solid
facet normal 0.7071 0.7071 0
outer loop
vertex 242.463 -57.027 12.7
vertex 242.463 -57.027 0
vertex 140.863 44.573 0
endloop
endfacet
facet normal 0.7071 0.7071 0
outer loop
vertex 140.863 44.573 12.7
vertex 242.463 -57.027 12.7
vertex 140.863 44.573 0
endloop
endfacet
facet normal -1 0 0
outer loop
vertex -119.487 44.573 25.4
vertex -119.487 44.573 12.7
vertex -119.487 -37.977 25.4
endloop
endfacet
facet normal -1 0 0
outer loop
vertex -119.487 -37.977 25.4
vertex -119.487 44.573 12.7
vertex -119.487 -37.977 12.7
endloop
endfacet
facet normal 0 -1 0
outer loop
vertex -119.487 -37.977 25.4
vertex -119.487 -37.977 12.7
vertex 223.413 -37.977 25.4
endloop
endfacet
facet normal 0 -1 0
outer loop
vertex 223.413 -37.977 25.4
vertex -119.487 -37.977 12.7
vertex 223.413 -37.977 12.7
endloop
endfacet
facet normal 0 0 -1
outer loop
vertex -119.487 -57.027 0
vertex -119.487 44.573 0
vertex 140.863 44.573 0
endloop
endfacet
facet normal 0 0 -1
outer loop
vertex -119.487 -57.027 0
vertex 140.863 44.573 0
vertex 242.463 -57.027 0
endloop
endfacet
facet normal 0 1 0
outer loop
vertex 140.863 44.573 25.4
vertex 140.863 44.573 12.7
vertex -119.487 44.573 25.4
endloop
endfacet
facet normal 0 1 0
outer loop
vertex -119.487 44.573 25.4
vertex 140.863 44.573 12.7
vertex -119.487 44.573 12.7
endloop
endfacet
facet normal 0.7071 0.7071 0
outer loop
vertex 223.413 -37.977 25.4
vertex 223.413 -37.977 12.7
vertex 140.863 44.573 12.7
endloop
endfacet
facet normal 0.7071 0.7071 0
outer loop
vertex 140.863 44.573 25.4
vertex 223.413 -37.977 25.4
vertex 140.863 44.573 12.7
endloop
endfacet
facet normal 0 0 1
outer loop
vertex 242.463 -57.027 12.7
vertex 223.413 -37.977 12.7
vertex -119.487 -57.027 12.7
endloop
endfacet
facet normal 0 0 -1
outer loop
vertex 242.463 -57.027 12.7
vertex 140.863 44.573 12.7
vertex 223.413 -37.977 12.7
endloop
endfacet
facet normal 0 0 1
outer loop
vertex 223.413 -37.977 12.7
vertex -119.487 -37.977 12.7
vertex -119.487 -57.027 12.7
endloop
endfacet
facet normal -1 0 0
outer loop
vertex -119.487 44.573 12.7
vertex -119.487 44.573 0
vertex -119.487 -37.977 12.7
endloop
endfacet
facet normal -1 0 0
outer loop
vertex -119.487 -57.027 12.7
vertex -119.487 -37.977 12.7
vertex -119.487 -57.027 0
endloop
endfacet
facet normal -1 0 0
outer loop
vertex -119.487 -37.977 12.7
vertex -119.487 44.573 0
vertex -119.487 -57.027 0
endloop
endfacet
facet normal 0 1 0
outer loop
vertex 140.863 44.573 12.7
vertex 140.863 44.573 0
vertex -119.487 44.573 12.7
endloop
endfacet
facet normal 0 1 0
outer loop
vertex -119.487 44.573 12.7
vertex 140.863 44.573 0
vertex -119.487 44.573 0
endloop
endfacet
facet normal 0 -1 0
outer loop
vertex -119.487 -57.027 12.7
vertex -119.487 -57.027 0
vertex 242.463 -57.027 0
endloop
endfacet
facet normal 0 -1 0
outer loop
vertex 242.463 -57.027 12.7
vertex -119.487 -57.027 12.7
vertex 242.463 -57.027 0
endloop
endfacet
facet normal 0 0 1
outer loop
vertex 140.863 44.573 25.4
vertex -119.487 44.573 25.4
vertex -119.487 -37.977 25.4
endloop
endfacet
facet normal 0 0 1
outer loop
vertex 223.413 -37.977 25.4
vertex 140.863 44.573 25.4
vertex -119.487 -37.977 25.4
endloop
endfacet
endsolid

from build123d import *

# Parameters (mm, degrees)
F1_DEPTH = 12.7
F2_DEPTH = 12.7


with BuildPart() as f1:
    # F0 (on Top) → F1 (new body)
    with BuildSketch(Plane.XY):
        Polygon((140.862602, 44.572849), (-119.487398, 44.572849), (-119.487398, -37.977151), (223.412602, -37.977151), align=None)
    extrude(amount=F1_DEPTH)

    # F0 (on Top) + F1_face (on face) → F2 (join)
    with BuildSketch(Plane.XY):
        Polygon((140.862602, 44.572849), (-119.487398, 44.572849), (-119.487398, -37.977151), (223.412602, -37.977151), align=None)
        Polygon((223.412602, -37.977151), (-119.487398, -37.977151), (-119.487398, -57.027151), (242.462602, -57.027151), align=None)
    with BuildSketch(Plane(origin=(32.266461, 1.415129, 12.7), x_dir=(1, 0, 0), z_dir=(0, 0, 1))):
        Polygon((108.59614, 43.157719), (-151.75386, 43.157719), (-151.75386, -39.392281), (191.14614, -39.392281), align=None)
    extrude(amount=F2_DEPTH)


solid = f1.part
